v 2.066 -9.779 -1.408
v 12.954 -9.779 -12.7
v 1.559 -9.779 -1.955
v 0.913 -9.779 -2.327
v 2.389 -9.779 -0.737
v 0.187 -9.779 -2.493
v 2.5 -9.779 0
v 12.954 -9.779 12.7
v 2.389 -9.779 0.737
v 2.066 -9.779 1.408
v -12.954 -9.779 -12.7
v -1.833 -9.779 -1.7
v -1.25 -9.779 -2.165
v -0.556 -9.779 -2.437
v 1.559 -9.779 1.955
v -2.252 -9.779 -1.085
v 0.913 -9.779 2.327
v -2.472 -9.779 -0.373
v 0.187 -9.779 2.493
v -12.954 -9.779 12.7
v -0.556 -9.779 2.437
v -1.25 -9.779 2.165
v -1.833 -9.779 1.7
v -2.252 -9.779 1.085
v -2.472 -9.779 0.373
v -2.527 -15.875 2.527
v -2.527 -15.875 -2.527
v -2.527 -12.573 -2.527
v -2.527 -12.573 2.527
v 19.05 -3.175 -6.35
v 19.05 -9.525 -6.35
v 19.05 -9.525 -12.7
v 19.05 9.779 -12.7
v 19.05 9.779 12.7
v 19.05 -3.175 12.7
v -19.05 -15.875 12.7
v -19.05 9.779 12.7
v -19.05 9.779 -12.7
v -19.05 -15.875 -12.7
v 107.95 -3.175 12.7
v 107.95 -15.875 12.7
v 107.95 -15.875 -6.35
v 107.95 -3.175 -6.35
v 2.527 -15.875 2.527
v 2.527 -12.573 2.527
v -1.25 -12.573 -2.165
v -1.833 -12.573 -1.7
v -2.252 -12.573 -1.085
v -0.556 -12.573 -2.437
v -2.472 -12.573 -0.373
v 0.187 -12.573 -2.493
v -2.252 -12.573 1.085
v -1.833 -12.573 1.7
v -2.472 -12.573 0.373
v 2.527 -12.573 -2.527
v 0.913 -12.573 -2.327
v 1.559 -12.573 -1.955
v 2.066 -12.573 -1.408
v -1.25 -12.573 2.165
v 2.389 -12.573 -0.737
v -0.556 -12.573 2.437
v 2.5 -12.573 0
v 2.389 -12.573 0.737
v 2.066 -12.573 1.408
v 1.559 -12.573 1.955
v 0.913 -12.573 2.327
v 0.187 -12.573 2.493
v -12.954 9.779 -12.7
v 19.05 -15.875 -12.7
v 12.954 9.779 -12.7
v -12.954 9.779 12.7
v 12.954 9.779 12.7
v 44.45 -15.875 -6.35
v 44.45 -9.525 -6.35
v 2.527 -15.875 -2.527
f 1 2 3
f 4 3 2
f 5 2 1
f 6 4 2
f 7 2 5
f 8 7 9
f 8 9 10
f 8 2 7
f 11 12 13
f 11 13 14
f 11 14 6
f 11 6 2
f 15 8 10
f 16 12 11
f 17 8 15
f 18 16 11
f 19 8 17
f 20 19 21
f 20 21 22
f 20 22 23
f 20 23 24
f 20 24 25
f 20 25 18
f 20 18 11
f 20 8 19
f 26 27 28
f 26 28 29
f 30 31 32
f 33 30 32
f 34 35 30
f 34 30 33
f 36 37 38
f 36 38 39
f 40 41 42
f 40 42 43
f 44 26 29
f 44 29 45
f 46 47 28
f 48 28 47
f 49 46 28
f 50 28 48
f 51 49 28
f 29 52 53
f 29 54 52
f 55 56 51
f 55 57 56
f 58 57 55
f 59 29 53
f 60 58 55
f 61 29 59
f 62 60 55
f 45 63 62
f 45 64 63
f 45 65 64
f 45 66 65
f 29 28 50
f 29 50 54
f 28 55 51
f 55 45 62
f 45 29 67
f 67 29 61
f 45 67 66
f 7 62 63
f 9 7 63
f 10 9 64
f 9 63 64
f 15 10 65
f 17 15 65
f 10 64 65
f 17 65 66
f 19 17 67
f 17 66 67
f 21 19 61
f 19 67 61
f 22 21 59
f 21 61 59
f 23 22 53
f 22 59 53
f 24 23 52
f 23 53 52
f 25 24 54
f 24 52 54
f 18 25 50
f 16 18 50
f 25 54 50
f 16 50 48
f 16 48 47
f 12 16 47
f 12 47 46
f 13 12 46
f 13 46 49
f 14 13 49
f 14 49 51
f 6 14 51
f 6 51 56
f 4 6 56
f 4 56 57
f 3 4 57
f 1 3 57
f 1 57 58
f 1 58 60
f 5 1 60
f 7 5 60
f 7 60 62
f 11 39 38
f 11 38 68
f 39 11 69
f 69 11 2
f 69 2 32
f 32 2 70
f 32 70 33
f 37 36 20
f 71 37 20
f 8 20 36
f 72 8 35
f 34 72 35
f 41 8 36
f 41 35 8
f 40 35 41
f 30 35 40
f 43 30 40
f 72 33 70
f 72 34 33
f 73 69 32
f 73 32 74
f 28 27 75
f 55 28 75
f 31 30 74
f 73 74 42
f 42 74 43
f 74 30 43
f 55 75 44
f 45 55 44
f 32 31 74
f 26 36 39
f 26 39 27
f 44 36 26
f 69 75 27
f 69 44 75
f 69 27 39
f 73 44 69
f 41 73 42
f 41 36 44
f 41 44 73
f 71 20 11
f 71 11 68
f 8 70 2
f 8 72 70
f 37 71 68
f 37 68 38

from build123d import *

# Parameters (mm, degrees)
F1_DEPTH = 12.7
F2_R     = 2.5
F3_DEPTH = 25.655
F4_W     = 5.0546
F4_H     = 5.0546
F5_DEPTH = 3.302
F6_W     = 88.9
F6_H     = 12.7
F7_DEPTH = 19.05
F9_DEPTH = 6.35


with BuildPart() as f1:
    # F0 (on Top) → F1 (new body, symmetric)
    with BuildSketch(Plane.XY):
        Polygon((12.954, 9.779), (12.954, -9.779), (-12.954, -9.779), (-12.954, 9.779), (-19.05, 9.779), (-19.05, -15.875), (19.05, -15.875), (19.05, 9.779), align=None)
    extrude(amount=F1_DEPTH, both=True)

    # F2 (on face) → F3 (cut, through all)
    with BuildSketch(Plane.XZ.offset(15.875)):
        Circle(F2_R)
    extrude(amount=-F3_DEPTH, mode=Mode.SUBTRACT)

    # F4 (on face) → F5 (cut)
    with BuildSketch(Plane.XZ.offset(15.875)):
        Rectangle(F4_W, F4_H)
    extrude(amount=-F5_DEPTH, mode=Mode.SUBTRACT)

    # F6 (on face) → F7 (join)
    with BuildSketch(Plane.XY.offset(12.7)):
        with Locations((63.5, -9.525)):
            Rectangle(F6_W, F6_H)
    extrude(amount=-F7_DEPTH)

    # F8 (on face) → F9 (join)
    with BuildSketch(Plane.XZ.offset(15.875)):
        Polygon((19.05, -6.35), (19.05, -12.7), (44.45, -6.35), align=None)
    extrude(amount=-F9_DEPTH)


solid = f1.part
